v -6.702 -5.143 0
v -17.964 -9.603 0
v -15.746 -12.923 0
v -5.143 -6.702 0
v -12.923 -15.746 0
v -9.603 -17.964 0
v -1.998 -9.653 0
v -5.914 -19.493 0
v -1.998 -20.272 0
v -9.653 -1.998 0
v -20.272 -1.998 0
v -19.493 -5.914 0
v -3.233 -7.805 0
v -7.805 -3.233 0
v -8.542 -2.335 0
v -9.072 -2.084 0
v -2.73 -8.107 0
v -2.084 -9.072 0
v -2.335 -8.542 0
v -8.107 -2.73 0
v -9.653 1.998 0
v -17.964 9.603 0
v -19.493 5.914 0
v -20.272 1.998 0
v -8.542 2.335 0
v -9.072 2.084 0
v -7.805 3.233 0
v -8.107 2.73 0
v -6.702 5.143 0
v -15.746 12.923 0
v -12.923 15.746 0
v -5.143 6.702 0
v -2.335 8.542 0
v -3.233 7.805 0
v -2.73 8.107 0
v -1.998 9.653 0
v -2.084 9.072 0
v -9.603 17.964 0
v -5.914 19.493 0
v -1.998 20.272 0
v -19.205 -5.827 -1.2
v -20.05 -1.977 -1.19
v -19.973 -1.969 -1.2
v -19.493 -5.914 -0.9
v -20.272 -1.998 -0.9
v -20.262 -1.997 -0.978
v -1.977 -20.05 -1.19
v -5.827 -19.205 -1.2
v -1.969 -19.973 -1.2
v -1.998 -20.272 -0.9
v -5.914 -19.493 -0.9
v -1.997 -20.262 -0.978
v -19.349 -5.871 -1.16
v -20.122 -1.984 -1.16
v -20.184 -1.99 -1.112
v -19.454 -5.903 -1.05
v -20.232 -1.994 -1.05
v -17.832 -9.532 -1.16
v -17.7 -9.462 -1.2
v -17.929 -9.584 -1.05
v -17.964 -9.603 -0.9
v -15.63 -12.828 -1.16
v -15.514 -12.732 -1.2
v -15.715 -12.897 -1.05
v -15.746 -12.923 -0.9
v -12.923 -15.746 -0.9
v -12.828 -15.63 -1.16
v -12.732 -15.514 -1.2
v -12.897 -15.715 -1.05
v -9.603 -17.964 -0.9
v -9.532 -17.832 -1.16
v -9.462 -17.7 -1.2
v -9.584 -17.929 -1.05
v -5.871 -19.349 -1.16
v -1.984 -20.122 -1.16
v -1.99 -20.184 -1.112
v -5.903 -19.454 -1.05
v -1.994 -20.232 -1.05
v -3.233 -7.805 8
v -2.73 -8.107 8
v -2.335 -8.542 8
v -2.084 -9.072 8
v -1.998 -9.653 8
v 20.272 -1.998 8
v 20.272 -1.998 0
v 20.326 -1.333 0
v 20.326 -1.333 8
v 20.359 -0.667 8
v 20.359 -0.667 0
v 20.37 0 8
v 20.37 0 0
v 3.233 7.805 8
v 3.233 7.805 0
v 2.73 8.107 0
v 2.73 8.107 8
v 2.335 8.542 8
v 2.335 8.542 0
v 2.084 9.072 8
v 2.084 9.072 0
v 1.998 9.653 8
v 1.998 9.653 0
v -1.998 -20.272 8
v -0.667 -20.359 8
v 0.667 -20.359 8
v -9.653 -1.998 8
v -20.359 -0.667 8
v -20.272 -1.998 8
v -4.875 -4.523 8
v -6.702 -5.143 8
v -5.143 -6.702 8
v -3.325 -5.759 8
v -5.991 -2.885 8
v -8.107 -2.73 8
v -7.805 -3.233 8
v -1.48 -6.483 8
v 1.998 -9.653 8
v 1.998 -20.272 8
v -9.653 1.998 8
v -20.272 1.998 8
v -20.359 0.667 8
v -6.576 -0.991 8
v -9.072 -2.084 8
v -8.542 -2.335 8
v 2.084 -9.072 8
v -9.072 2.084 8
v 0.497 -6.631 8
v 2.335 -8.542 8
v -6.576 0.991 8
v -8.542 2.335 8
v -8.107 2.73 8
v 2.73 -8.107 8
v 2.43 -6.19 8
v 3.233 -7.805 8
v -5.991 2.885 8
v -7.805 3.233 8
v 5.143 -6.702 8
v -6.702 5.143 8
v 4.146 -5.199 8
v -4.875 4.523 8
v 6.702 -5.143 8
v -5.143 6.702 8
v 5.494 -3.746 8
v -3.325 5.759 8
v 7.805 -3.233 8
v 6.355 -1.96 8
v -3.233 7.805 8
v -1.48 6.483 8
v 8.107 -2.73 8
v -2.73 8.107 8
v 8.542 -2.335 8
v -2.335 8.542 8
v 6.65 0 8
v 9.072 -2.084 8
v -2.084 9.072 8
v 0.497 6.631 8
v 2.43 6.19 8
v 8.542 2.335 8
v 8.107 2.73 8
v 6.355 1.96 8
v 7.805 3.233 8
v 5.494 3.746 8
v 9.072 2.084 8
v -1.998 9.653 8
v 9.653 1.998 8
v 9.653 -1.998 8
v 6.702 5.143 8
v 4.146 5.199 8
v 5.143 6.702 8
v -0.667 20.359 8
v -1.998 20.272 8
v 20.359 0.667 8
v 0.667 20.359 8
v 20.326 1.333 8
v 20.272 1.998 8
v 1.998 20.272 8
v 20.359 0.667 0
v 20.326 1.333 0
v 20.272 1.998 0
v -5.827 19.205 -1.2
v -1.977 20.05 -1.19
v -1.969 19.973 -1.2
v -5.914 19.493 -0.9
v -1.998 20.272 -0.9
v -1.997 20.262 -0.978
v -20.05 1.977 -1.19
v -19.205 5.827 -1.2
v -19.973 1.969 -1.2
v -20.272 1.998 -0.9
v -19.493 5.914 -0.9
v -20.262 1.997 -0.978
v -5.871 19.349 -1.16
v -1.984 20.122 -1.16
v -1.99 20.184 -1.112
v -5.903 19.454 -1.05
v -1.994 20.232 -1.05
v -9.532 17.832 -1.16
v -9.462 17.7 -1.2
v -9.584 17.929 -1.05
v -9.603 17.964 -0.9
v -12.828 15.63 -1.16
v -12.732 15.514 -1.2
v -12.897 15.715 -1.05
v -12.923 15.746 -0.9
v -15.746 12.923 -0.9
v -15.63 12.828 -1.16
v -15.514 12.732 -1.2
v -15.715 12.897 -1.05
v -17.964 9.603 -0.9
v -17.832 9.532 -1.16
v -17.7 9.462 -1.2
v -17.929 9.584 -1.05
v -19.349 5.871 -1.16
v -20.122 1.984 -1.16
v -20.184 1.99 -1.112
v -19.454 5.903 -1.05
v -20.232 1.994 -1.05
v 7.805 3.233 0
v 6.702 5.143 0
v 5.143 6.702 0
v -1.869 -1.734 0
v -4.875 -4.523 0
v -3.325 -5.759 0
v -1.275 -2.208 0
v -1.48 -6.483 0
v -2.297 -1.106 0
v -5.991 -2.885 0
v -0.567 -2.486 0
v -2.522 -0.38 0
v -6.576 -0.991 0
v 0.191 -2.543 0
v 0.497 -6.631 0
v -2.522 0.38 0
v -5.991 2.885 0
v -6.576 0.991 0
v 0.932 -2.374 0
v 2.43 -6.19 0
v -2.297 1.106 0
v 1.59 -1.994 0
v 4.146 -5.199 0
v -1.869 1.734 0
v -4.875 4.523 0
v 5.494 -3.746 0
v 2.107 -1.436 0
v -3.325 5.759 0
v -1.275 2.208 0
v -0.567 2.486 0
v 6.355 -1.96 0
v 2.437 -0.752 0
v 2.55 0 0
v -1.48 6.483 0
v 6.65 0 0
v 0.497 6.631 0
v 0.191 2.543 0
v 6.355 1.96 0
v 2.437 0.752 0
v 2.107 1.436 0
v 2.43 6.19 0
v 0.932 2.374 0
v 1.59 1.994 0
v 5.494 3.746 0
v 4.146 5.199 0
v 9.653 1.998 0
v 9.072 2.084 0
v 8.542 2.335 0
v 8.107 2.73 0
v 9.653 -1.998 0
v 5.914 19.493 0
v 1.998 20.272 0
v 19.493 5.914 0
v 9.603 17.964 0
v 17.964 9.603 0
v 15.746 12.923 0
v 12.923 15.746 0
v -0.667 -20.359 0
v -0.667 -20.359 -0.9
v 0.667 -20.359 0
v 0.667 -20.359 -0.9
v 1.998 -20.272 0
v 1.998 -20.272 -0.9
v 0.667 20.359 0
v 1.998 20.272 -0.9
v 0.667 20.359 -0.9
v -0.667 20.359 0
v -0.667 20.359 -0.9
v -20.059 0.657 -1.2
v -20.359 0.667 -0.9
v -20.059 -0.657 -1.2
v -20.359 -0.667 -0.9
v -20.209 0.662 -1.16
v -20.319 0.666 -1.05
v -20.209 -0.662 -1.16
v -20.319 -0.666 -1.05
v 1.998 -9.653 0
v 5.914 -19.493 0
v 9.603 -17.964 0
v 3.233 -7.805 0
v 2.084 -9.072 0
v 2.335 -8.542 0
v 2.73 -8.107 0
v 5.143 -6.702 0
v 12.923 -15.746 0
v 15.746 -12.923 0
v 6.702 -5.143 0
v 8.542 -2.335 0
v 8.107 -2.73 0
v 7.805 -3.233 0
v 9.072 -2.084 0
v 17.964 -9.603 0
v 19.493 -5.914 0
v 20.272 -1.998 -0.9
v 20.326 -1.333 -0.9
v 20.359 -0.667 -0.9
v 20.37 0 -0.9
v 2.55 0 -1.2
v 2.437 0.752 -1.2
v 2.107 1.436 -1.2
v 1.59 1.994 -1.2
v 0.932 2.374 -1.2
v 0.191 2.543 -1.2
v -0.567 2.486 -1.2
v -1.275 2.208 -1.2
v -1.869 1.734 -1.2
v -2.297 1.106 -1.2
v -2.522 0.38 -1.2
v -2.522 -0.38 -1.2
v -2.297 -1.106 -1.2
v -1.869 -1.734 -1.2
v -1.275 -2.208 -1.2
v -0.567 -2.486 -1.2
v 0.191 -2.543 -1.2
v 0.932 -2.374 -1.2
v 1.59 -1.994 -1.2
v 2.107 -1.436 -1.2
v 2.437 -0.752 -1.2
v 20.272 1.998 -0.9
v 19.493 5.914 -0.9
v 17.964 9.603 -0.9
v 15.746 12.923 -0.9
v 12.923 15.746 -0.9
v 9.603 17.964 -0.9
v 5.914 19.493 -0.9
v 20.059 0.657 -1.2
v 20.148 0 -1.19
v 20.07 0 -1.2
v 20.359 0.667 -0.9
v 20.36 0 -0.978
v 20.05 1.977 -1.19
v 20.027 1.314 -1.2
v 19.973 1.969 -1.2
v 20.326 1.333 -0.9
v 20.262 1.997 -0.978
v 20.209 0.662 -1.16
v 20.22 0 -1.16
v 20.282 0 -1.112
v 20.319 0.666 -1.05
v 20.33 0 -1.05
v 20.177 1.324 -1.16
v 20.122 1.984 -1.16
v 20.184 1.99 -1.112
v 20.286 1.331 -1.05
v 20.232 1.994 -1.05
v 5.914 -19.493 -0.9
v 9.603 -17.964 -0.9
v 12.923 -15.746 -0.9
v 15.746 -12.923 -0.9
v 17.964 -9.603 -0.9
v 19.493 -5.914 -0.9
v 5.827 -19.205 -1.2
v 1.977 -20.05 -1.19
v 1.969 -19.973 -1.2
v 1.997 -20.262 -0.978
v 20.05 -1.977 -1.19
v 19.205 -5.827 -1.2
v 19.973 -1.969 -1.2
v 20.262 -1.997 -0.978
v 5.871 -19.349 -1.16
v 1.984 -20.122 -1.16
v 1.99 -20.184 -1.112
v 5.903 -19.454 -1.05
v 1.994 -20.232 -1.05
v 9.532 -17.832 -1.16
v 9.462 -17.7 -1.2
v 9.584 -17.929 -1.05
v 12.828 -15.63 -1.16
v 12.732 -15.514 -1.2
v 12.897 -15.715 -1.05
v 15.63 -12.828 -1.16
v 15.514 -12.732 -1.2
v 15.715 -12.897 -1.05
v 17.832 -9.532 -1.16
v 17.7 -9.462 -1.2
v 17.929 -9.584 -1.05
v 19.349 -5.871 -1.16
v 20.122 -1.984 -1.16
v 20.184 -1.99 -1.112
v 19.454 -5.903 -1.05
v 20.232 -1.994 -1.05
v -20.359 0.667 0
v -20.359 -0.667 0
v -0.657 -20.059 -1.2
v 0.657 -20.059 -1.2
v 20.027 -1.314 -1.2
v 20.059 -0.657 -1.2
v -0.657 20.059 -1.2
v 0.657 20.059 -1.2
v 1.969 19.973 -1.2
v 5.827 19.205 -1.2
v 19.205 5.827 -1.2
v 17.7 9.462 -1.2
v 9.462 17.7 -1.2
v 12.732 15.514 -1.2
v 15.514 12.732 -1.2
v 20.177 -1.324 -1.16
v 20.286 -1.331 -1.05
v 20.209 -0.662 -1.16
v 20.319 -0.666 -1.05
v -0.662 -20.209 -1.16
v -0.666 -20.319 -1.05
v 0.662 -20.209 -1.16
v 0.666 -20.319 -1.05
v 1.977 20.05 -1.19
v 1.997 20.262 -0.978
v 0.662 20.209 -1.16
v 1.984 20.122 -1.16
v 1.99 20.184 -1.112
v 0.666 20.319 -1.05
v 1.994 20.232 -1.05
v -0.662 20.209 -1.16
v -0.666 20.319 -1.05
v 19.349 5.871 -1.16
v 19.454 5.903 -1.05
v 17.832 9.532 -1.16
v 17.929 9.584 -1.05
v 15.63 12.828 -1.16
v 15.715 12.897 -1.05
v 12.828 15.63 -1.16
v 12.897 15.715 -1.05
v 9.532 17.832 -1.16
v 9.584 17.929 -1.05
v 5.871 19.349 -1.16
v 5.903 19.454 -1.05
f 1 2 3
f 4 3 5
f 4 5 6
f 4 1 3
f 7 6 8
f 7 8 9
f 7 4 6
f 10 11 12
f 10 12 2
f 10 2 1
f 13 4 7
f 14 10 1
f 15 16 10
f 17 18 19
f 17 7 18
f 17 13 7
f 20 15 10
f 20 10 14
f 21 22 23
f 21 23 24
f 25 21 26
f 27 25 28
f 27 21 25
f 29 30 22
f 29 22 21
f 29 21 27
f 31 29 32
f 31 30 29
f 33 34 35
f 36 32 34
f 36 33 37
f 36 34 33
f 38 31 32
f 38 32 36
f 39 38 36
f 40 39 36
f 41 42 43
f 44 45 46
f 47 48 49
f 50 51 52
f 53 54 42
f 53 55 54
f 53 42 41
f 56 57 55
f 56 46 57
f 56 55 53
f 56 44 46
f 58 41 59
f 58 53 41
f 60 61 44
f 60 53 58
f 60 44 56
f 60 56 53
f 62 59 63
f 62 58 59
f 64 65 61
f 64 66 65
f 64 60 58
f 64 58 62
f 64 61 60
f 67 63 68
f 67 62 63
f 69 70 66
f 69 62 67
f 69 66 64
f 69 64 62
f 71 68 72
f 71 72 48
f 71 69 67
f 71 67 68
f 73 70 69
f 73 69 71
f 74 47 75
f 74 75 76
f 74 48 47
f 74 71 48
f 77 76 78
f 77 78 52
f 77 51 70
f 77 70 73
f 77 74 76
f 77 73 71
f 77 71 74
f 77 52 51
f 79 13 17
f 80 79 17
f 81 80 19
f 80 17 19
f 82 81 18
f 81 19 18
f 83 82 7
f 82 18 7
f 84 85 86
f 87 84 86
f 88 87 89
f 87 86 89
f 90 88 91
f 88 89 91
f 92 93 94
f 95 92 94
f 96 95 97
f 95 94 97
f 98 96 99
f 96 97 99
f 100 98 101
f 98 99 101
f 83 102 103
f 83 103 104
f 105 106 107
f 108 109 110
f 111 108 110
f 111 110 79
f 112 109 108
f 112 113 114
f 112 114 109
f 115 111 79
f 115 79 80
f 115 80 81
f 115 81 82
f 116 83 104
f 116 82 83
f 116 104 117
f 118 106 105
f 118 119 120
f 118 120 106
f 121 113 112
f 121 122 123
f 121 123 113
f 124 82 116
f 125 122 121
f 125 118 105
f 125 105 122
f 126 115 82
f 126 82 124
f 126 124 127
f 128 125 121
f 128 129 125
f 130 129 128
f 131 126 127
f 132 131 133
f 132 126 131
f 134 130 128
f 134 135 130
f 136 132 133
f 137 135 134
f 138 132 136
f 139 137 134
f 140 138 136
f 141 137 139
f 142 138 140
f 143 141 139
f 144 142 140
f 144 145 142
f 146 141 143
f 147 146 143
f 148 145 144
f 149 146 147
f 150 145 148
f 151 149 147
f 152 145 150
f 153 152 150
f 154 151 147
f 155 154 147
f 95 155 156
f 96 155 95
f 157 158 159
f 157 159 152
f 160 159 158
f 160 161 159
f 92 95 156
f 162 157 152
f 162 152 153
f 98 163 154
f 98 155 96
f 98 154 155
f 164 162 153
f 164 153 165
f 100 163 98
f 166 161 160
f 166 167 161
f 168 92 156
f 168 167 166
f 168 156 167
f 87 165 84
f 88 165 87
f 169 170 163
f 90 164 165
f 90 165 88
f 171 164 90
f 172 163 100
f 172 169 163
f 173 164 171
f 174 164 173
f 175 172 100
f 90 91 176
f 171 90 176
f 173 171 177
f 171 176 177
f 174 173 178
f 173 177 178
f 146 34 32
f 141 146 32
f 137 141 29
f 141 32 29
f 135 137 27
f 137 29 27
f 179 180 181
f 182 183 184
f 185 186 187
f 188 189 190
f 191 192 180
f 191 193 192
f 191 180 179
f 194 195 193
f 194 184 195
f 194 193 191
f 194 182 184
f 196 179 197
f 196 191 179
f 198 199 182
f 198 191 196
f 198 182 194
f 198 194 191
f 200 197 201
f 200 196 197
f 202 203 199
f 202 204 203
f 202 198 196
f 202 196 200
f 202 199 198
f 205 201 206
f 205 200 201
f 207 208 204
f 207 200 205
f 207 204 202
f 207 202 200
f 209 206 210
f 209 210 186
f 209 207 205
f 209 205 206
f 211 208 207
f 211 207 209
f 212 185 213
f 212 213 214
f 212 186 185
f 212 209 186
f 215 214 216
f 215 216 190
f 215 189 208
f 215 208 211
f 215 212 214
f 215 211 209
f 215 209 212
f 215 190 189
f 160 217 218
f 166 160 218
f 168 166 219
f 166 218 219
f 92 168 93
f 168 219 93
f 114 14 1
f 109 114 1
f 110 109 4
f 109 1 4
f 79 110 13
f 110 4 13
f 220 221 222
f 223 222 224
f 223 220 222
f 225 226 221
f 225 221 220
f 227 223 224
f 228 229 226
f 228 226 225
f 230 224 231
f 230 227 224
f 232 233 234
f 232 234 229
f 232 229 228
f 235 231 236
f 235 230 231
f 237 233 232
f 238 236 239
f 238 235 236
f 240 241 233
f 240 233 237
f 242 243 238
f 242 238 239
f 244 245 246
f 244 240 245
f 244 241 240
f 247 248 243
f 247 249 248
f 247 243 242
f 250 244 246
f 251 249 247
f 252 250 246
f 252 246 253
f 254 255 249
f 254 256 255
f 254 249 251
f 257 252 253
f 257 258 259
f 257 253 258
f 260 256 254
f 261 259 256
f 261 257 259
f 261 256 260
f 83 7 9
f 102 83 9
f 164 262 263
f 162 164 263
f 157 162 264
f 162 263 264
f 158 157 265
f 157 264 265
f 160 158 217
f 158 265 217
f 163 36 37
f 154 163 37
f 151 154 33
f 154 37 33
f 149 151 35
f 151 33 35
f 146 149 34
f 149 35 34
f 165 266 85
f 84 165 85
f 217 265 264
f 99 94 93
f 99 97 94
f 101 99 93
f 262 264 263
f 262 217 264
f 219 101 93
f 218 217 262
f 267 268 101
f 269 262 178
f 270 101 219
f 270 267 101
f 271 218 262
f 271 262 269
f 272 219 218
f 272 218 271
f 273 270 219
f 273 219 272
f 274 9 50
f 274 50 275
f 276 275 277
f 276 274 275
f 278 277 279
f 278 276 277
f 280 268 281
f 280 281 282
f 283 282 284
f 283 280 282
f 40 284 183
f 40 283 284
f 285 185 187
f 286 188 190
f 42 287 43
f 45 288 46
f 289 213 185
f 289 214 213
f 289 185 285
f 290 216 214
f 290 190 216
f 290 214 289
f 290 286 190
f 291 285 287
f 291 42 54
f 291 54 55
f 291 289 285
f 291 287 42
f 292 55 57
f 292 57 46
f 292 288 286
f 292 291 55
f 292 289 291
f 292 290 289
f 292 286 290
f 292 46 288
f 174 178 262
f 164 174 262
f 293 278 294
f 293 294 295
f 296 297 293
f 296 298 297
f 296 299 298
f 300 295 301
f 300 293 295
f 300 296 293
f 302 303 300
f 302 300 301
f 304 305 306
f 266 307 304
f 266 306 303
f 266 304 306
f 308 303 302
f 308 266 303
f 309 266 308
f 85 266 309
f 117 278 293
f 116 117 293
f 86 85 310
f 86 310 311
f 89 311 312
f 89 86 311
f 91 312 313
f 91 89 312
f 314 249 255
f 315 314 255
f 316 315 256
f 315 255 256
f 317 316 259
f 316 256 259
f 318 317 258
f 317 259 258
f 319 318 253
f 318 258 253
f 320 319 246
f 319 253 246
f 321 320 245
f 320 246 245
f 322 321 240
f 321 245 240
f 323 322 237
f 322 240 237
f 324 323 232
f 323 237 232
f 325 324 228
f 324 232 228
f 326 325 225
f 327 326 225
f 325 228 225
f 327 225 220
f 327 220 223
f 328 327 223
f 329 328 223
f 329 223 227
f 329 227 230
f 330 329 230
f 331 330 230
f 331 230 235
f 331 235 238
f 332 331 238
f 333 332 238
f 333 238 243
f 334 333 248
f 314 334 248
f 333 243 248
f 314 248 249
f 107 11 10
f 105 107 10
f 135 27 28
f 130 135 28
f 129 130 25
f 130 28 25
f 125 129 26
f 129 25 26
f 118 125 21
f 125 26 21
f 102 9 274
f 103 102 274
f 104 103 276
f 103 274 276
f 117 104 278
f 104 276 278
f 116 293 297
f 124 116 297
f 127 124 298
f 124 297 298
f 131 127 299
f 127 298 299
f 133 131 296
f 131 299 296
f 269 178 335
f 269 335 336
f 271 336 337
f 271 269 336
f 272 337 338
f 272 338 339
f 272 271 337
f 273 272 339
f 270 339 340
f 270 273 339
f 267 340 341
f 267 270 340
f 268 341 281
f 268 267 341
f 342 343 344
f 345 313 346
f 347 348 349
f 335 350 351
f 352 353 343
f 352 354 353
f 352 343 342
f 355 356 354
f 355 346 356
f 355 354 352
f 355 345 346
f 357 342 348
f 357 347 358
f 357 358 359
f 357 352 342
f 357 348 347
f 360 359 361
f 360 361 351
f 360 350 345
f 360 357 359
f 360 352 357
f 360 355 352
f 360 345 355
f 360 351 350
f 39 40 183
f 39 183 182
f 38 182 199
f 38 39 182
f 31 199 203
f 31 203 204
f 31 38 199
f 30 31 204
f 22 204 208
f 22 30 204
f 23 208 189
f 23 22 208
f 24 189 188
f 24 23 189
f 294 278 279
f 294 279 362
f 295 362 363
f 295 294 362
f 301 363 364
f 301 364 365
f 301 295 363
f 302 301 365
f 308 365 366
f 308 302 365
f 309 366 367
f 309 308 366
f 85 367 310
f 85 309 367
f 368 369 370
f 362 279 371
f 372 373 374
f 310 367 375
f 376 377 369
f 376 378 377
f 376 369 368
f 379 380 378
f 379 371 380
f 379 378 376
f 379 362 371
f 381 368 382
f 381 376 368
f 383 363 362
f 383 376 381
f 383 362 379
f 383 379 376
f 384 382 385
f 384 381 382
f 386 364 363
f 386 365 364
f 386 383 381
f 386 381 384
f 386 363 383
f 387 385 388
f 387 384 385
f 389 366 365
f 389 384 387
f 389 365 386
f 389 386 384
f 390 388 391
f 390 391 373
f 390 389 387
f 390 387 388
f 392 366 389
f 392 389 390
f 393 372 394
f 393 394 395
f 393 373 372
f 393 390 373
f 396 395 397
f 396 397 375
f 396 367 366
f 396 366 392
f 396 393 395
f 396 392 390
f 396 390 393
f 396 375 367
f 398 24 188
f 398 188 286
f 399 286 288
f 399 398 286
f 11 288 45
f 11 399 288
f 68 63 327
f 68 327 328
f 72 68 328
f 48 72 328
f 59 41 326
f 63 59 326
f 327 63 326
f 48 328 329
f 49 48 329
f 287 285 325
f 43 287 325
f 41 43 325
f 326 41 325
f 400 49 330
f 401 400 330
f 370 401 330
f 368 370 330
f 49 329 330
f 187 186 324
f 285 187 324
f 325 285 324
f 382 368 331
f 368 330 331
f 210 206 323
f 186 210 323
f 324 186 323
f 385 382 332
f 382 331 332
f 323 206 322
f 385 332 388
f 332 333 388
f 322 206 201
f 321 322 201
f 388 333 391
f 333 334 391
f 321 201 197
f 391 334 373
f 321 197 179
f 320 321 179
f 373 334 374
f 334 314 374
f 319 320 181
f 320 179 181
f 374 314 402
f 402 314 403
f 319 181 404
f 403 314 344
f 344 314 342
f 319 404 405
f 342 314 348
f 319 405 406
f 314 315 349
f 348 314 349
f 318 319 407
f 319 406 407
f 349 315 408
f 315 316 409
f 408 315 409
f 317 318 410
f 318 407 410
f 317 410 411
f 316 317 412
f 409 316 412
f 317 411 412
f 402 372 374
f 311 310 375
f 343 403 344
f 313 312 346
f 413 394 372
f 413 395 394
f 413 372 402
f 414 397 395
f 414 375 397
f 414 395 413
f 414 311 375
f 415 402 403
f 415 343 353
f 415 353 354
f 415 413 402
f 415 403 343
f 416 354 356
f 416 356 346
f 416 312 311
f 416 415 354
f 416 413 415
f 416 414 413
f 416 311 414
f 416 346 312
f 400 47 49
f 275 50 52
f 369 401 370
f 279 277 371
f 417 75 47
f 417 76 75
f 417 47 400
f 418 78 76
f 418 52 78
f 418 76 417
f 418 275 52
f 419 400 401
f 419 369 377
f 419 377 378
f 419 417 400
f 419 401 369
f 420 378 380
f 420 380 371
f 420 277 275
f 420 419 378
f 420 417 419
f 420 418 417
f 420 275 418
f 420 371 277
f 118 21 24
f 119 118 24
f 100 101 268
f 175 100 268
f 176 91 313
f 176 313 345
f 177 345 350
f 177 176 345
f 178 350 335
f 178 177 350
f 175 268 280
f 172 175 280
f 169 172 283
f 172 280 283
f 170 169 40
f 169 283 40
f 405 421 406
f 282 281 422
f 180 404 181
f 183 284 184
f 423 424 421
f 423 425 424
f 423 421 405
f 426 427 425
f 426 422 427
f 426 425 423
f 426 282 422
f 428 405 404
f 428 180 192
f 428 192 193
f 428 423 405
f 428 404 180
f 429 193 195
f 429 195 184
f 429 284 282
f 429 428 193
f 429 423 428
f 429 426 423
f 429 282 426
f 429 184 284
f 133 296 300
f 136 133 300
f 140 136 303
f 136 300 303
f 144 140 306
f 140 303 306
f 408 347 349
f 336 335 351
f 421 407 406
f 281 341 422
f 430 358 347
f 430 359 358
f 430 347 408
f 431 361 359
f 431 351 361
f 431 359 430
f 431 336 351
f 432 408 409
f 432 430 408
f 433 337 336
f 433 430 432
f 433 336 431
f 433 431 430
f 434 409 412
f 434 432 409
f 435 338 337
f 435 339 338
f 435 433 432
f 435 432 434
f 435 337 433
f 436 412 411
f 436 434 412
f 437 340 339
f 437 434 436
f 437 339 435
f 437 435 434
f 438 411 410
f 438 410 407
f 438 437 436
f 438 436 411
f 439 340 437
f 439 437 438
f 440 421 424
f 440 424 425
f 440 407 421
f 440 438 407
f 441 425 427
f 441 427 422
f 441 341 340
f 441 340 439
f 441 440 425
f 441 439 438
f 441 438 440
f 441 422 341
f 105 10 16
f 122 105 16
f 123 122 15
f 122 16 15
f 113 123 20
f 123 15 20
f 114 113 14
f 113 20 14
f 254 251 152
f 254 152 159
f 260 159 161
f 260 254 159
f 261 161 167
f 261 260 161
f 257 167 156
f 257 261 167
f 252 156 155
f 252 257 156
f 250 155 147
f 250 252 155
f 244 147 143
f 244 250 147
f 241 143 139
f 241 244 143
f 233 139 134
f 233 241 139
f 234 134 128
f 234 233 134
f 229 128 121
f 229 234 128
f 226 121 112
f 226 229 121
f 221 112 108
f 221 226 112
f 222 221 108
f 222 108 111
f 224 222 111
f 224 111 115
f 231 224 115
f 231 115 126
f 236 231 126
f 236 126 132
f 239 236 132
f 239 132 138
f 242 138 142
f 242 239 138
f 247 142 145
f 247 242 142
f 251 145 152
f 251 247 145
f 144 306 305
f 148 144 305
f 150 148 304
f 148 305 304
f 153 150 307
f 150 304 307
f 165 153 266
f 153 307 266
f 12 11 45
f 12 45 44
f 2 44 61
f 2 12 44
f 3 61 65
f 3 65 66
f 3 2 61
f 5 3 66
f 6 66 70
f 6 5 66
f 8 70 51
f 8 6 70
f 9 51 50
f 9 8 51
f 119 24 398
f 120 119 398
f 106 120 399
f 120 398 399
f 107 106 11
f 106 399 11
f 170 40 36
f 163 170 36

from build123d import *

# Parameters (mm, degrees)
F0_R     = 6.65
F0_R_2   = 2.55
F1_DEPTH = 1.2
F2_DEPTH = 8
F3_R     = 0.3


# Not quite as in the source:
# - a feature names something its author has since deleted; it is built from what else it names


with BuildPart() as f1:
    # F0 (on Top) → F1 (new body)
    with BuildSketch(Plane.XY):
        with BuildLine():
            Line((9.6529388756, 1.998378199), (20.2717385681, 1.998378199))
            ThreePointArc((20.2717385681, 1.998378199), (14.4037651328, 14.4037651328), (1.998378199, 20.2717385681))
            Line((1.998378199, 20.2717385681), (1.998378199, 9.6529388756))
            ThreePointArc((1.998378199, 9.6529388756), (2.3354389744, 8.5417984096), (3.2330113343, 7.8051798106))
            ThreePointArc((3.2330113343, 7.8051798106), (5.9738260003, 5.9738260003), (7.8051798106, 3.2330113343))
            ThreePointArc((7.8051798106, 3.2330113343), (8.5417984096, 2.3354389744), (9.6529388756, 1.998378199))
        make_face()
        with BuildLine():
            Line((-1.998378199, 9.6529388756), (-1.998378199, 20.2717385681))
            ThreePointArc((-1.998378199, 20.2717385681), (-14.4037651328, 14.4037651328), (-20.2717385681, 1.998378199))
            Line((-20.2717385681, 1.998378199), (-9.6529388756, 1.998378199))
            ThreePointArc((-9.6529388756, 1.998378199), (-8.5417984096, 2.3354389744), (-7.8051798106, 3.2330113343))
            ThreePointArc((-7.8051798106, 3.2330113343), (-5.9738260003, 5.9738260003), (-3.2330113343, 7.8051798106))
            ThreePointArc((-3.2330113343, 7.8051798106), (-2.3354389744, 8.5417984096), (-1.998378199, 9.6529388756))
        make_face()
        with BuildLine():
            ThreePointArc((-20.2717385681, -1.998378199), (-14.4037651328, -14.4037651328), (-1.998378199, -20.2717385681))
            Line((-1.998378199, -20.2717385681), (-1.998378199, -9.6529388756))
            ThreePointArc((-1.998378199, -9.6529388756), (-2.3354389744, -8.5417984096), (-3.2330113343, -7.8051798106))
            ThreePointArc((-3.2330113343, -7.8051798106), (-5.9738260003, -5.9738260003), (-7.8051798106, -3.2330113343))
            ThreePointArc((-7.8051798106, -3.2330113343), (-8.5417984096, -2.3354389744), (-9.6529388756, -1.998378199))
            Line((-9.6529388756, -1.998378199), (-20.2717385681, -1.998378199))
        make_face()
        with BuildLine():
            ThreePointArc((1.998378199, -20.2717385681), (14.4037651328, -14.4037651328), (20.2717385681, -1.998378199))
            Line((20.2717385681, -1.998378199), (9.6529388756, -1.998378199))
            ThreePointArc((9.6529388756, -1.998378199), (8.5417984096, -2.3354389744), (7.8051798106, -3.2330113343))
            ThreePointArc((7.8051798106, -3.2330113343), (5.9738260003, -5.9738260003), (3.2330113343, -7.8051798106))
            ThreePointArc((3.2330113343, -7.8051798106), (2.3354389744, -8.5417984096), (1.998378199, -9.6529388756))
            Line((1.998378199, -9.6529388756), (1.998378199, -20.2717385681))
        make_face()
        with BuildLine():
            ThreePointArc((20.2717385681, -1.998378199), (20.3454198117, -1.0003962634), (20.37, 0))
            ThreePointArc((20.37, 0), (20.3454198117, 1.0003962634), (20.2717385681, 1.998378199))
            Line((20.2717385681, 1.998378199), (9.6529388756, 1.998378199))
            ThreePointArc((9.6529388756, 1.998378199), (8.5417984096, 2.3354389744), (7.8051798106, 3.2330113343))
            ThreePointArc((7.8051798106, 3.2330113343), (5.9738260003, 5.9738260003), (3.2330113343, 7.8051798106))
            ThreePointArc((3.2330113343, 7.8051798106), (2.3354389744, 8.5417984096), (1.998378199, 9.6529388756))
            Line((1.998378199, 9.6529388756), (1.998378199, 20.2717385681))
            ThreePointArc((1.998378199, 20.2717385681), (0, 20.37), (-1.998378199, 20.2717385681))
            Line((-1.998378199, 20.2717385681), (-1.998378199, 9.6529388756))
            ThreePointArc((-1.998378199, 9.6529388756), (-2.3354389744, 8.5417984096), (-3.2330113343, 7.8051798106))
            ThreePointArc((-3.2330113343, 7.8051798106), (-5.9738260003, 5.9738260003), (-7.8051798106, 3.2330113343))
            ThreePointArc((-7.8051798106, 3.2330113343), (-8.5417984096, 2.3354389744), (-9.6529388756, 1.998378199))
            Line((-9.6529388756, 1.998378199), (-20.2717385681, 1.998378199))
            ThreePointArc((-20.2717385681, 1.998378199), (-20.37, 0), (-20.2717385681, -1.998378199))
            Line((-20.2717385681, -1.998378199), (-9.6529388756, -1.998378199))
            ThreePointArc((-9.6529388756, -1.998378199), (-8.5417984096, -2.3354389744), (-7.8051798106, -3.2330113343))
            ThreePointArc((-7.8051798106, -3.2330113343), (-5.9738260003, -5.9738260003), (-3.2330113343, -7.8051798106))
            ThreePointArc((-3.2330113343, -7.8051798106), (-2.3354389744, -8.5417984096), (-1.998378199, -9.6529388756))
            Line((-1.998378199, -9.6529388756), (-1.998378199, -20.2717385681))
            ThreePointArc((-1.998378199, -20.2717385681), (0, -20.37), (1.998378199, -20.2717385681))
            Line((1.998378199, -20.2717385681), (1.998378199, -9.6529388756))
            ThreePointArc((1.998378199, -9.6529388756), (2.3354389744, -8.5417984096), (3.2330113343, -7.8051798106))
            ThreePointArc((3.2330113343, -7.8051798106), (5.9738260003, -5.9738260003), (7.8051798106, -3.2330113343))
            ThreePointArc((7.8051798106, -3.2330113343), (8.5417984096, -2.3354389744), (9.6529388756, -1.998378199))
            Line((9.6529388756, -1.998378199), (20.2717385681, -1.998378199))
        make_face()
        Circle(F0_R, mode=Mode.SUBTRACT)
        Circle(F0_R)
        Circle(F0_R_2, mode=Mode.SUBTRACT)
    extrude(amount=-F1_DEPTH)

    # F0 (on Top) → F2 (join)
    with BuildSketch(Plane.XY):
        with BuildLine():
            ThreePointArc((20.2717385681, -1.998378199), (20.3454198117, -1.0003962634), (20.37, 0))
            ThreePointArc((20.37, 0), (20.3454198117, 1.0003962634), (20.2717385681, 1.998378199))
            Line((20.2717385681, 1.998378199), (9.6529388756, 1.998378199))
            ThreePointArc((9.6529388756, 1.998378199), (8.5417984096, 2.3354389744), (7.8051798106, 3.2330113343))
            ThreePointArc((7.8051798106, 3.2330113343), (5.9738260003, 5.9738260003), (3.2330113343, 7.8051798106))
            ThreePointArc((3.2330113343, 7.8051798106), (2.3354389744, 8.5417984096), (1.998378199, 9.6529388756))
            Line((1.998378199, 9.6529388756), (1.998378199, 20.2717385681))
            ThreePointArc((1.998378199, 20.2717385681), (0, 20.37), (-1.998378199, 20.2717385681))
            Line((-1.998378199, 20.2717385681), (-1.998378199, 9.6529388756))
            ThreePointArc((-1.998378199, 9.6529388756), (-2.3354389744, 8.5417984096), (-3.2330113343, 7.8051798106))
            ThreePointArc((-3.2330113343, 7.8051798106), (-5.9738260003, 5.9738260003), (-7.8051798106, 3.2330113343))
            ThreePointArc((-7.8051798106, 3.2330113343), (-8.5417984096, 2.3354389744), (-9.6529388756, 1.998378199))
            Line((-9.6529388756, 1.998378199), (-20.2717385681, 1.998378199))
            ThreePointArc((-20.2717385681, 1.998378199), (-20.37, 0), (-20.2717385681, -1.998378199))
            Line((-20.2717385681, -1.998378199), (-9.6529388756, -1.998378199))
            ThreePointArc((-9.6529388756, -1.998378199), (-8.5417984096, -2.3354389744), (-7.8051798106, -3.2330113343))
            ThreePointArc((-7.8051798106, -3.2330113343), (-5.9738260003, -5.9738260003), (-3.2330113343, -7.8051798106))
            ThreePointArc((-3.2330113343, -7.8051798106), (-2.3354389744, -8.5417984096), (-1.998378199, -9.6529388756))
            Line((-1.998378199, -9.6529388756), (-1.998378199, -20.2717385681))
            ThreePointArc((-1.998378199, -20.2717385681), (0, -20.37), (1.998378199, -20.2717385681))
            Line((1.998378199, -20.2717385681), (1.998378199, -9.6529388756))
            ThreePointArc((1.998378199, -9.6529388756), (2.3354389744, -8.5417984096), (3.2330113343, -7.8051798106))
            ThreePointArc((3.2330113343, -7.8051798106), (5.9738260003, -5.9738260003), (7.8051798106, -3.2330113343))
            ThreePointArc((7.8051798106, -3.2330113343), (8.5417984096, -2.3354389744), (9.6529388756, -1.998378199))
            Line((9.6529388756, -1.998378199), (20.2717385681, -1.998378199))
        make_face()
        Circle(F0_R, mode=Mode.SUBTRACT)
    extrude(amount=F2_DEPTH)

    # F3
    f3_edges = [f1.edges().sort_by_distance(p)[0] for p in [
        (-1.998378, -20.271739, -1.2),
    ]]
    fillet(f3_edges, radius=F3_R)


solid = f1.part
